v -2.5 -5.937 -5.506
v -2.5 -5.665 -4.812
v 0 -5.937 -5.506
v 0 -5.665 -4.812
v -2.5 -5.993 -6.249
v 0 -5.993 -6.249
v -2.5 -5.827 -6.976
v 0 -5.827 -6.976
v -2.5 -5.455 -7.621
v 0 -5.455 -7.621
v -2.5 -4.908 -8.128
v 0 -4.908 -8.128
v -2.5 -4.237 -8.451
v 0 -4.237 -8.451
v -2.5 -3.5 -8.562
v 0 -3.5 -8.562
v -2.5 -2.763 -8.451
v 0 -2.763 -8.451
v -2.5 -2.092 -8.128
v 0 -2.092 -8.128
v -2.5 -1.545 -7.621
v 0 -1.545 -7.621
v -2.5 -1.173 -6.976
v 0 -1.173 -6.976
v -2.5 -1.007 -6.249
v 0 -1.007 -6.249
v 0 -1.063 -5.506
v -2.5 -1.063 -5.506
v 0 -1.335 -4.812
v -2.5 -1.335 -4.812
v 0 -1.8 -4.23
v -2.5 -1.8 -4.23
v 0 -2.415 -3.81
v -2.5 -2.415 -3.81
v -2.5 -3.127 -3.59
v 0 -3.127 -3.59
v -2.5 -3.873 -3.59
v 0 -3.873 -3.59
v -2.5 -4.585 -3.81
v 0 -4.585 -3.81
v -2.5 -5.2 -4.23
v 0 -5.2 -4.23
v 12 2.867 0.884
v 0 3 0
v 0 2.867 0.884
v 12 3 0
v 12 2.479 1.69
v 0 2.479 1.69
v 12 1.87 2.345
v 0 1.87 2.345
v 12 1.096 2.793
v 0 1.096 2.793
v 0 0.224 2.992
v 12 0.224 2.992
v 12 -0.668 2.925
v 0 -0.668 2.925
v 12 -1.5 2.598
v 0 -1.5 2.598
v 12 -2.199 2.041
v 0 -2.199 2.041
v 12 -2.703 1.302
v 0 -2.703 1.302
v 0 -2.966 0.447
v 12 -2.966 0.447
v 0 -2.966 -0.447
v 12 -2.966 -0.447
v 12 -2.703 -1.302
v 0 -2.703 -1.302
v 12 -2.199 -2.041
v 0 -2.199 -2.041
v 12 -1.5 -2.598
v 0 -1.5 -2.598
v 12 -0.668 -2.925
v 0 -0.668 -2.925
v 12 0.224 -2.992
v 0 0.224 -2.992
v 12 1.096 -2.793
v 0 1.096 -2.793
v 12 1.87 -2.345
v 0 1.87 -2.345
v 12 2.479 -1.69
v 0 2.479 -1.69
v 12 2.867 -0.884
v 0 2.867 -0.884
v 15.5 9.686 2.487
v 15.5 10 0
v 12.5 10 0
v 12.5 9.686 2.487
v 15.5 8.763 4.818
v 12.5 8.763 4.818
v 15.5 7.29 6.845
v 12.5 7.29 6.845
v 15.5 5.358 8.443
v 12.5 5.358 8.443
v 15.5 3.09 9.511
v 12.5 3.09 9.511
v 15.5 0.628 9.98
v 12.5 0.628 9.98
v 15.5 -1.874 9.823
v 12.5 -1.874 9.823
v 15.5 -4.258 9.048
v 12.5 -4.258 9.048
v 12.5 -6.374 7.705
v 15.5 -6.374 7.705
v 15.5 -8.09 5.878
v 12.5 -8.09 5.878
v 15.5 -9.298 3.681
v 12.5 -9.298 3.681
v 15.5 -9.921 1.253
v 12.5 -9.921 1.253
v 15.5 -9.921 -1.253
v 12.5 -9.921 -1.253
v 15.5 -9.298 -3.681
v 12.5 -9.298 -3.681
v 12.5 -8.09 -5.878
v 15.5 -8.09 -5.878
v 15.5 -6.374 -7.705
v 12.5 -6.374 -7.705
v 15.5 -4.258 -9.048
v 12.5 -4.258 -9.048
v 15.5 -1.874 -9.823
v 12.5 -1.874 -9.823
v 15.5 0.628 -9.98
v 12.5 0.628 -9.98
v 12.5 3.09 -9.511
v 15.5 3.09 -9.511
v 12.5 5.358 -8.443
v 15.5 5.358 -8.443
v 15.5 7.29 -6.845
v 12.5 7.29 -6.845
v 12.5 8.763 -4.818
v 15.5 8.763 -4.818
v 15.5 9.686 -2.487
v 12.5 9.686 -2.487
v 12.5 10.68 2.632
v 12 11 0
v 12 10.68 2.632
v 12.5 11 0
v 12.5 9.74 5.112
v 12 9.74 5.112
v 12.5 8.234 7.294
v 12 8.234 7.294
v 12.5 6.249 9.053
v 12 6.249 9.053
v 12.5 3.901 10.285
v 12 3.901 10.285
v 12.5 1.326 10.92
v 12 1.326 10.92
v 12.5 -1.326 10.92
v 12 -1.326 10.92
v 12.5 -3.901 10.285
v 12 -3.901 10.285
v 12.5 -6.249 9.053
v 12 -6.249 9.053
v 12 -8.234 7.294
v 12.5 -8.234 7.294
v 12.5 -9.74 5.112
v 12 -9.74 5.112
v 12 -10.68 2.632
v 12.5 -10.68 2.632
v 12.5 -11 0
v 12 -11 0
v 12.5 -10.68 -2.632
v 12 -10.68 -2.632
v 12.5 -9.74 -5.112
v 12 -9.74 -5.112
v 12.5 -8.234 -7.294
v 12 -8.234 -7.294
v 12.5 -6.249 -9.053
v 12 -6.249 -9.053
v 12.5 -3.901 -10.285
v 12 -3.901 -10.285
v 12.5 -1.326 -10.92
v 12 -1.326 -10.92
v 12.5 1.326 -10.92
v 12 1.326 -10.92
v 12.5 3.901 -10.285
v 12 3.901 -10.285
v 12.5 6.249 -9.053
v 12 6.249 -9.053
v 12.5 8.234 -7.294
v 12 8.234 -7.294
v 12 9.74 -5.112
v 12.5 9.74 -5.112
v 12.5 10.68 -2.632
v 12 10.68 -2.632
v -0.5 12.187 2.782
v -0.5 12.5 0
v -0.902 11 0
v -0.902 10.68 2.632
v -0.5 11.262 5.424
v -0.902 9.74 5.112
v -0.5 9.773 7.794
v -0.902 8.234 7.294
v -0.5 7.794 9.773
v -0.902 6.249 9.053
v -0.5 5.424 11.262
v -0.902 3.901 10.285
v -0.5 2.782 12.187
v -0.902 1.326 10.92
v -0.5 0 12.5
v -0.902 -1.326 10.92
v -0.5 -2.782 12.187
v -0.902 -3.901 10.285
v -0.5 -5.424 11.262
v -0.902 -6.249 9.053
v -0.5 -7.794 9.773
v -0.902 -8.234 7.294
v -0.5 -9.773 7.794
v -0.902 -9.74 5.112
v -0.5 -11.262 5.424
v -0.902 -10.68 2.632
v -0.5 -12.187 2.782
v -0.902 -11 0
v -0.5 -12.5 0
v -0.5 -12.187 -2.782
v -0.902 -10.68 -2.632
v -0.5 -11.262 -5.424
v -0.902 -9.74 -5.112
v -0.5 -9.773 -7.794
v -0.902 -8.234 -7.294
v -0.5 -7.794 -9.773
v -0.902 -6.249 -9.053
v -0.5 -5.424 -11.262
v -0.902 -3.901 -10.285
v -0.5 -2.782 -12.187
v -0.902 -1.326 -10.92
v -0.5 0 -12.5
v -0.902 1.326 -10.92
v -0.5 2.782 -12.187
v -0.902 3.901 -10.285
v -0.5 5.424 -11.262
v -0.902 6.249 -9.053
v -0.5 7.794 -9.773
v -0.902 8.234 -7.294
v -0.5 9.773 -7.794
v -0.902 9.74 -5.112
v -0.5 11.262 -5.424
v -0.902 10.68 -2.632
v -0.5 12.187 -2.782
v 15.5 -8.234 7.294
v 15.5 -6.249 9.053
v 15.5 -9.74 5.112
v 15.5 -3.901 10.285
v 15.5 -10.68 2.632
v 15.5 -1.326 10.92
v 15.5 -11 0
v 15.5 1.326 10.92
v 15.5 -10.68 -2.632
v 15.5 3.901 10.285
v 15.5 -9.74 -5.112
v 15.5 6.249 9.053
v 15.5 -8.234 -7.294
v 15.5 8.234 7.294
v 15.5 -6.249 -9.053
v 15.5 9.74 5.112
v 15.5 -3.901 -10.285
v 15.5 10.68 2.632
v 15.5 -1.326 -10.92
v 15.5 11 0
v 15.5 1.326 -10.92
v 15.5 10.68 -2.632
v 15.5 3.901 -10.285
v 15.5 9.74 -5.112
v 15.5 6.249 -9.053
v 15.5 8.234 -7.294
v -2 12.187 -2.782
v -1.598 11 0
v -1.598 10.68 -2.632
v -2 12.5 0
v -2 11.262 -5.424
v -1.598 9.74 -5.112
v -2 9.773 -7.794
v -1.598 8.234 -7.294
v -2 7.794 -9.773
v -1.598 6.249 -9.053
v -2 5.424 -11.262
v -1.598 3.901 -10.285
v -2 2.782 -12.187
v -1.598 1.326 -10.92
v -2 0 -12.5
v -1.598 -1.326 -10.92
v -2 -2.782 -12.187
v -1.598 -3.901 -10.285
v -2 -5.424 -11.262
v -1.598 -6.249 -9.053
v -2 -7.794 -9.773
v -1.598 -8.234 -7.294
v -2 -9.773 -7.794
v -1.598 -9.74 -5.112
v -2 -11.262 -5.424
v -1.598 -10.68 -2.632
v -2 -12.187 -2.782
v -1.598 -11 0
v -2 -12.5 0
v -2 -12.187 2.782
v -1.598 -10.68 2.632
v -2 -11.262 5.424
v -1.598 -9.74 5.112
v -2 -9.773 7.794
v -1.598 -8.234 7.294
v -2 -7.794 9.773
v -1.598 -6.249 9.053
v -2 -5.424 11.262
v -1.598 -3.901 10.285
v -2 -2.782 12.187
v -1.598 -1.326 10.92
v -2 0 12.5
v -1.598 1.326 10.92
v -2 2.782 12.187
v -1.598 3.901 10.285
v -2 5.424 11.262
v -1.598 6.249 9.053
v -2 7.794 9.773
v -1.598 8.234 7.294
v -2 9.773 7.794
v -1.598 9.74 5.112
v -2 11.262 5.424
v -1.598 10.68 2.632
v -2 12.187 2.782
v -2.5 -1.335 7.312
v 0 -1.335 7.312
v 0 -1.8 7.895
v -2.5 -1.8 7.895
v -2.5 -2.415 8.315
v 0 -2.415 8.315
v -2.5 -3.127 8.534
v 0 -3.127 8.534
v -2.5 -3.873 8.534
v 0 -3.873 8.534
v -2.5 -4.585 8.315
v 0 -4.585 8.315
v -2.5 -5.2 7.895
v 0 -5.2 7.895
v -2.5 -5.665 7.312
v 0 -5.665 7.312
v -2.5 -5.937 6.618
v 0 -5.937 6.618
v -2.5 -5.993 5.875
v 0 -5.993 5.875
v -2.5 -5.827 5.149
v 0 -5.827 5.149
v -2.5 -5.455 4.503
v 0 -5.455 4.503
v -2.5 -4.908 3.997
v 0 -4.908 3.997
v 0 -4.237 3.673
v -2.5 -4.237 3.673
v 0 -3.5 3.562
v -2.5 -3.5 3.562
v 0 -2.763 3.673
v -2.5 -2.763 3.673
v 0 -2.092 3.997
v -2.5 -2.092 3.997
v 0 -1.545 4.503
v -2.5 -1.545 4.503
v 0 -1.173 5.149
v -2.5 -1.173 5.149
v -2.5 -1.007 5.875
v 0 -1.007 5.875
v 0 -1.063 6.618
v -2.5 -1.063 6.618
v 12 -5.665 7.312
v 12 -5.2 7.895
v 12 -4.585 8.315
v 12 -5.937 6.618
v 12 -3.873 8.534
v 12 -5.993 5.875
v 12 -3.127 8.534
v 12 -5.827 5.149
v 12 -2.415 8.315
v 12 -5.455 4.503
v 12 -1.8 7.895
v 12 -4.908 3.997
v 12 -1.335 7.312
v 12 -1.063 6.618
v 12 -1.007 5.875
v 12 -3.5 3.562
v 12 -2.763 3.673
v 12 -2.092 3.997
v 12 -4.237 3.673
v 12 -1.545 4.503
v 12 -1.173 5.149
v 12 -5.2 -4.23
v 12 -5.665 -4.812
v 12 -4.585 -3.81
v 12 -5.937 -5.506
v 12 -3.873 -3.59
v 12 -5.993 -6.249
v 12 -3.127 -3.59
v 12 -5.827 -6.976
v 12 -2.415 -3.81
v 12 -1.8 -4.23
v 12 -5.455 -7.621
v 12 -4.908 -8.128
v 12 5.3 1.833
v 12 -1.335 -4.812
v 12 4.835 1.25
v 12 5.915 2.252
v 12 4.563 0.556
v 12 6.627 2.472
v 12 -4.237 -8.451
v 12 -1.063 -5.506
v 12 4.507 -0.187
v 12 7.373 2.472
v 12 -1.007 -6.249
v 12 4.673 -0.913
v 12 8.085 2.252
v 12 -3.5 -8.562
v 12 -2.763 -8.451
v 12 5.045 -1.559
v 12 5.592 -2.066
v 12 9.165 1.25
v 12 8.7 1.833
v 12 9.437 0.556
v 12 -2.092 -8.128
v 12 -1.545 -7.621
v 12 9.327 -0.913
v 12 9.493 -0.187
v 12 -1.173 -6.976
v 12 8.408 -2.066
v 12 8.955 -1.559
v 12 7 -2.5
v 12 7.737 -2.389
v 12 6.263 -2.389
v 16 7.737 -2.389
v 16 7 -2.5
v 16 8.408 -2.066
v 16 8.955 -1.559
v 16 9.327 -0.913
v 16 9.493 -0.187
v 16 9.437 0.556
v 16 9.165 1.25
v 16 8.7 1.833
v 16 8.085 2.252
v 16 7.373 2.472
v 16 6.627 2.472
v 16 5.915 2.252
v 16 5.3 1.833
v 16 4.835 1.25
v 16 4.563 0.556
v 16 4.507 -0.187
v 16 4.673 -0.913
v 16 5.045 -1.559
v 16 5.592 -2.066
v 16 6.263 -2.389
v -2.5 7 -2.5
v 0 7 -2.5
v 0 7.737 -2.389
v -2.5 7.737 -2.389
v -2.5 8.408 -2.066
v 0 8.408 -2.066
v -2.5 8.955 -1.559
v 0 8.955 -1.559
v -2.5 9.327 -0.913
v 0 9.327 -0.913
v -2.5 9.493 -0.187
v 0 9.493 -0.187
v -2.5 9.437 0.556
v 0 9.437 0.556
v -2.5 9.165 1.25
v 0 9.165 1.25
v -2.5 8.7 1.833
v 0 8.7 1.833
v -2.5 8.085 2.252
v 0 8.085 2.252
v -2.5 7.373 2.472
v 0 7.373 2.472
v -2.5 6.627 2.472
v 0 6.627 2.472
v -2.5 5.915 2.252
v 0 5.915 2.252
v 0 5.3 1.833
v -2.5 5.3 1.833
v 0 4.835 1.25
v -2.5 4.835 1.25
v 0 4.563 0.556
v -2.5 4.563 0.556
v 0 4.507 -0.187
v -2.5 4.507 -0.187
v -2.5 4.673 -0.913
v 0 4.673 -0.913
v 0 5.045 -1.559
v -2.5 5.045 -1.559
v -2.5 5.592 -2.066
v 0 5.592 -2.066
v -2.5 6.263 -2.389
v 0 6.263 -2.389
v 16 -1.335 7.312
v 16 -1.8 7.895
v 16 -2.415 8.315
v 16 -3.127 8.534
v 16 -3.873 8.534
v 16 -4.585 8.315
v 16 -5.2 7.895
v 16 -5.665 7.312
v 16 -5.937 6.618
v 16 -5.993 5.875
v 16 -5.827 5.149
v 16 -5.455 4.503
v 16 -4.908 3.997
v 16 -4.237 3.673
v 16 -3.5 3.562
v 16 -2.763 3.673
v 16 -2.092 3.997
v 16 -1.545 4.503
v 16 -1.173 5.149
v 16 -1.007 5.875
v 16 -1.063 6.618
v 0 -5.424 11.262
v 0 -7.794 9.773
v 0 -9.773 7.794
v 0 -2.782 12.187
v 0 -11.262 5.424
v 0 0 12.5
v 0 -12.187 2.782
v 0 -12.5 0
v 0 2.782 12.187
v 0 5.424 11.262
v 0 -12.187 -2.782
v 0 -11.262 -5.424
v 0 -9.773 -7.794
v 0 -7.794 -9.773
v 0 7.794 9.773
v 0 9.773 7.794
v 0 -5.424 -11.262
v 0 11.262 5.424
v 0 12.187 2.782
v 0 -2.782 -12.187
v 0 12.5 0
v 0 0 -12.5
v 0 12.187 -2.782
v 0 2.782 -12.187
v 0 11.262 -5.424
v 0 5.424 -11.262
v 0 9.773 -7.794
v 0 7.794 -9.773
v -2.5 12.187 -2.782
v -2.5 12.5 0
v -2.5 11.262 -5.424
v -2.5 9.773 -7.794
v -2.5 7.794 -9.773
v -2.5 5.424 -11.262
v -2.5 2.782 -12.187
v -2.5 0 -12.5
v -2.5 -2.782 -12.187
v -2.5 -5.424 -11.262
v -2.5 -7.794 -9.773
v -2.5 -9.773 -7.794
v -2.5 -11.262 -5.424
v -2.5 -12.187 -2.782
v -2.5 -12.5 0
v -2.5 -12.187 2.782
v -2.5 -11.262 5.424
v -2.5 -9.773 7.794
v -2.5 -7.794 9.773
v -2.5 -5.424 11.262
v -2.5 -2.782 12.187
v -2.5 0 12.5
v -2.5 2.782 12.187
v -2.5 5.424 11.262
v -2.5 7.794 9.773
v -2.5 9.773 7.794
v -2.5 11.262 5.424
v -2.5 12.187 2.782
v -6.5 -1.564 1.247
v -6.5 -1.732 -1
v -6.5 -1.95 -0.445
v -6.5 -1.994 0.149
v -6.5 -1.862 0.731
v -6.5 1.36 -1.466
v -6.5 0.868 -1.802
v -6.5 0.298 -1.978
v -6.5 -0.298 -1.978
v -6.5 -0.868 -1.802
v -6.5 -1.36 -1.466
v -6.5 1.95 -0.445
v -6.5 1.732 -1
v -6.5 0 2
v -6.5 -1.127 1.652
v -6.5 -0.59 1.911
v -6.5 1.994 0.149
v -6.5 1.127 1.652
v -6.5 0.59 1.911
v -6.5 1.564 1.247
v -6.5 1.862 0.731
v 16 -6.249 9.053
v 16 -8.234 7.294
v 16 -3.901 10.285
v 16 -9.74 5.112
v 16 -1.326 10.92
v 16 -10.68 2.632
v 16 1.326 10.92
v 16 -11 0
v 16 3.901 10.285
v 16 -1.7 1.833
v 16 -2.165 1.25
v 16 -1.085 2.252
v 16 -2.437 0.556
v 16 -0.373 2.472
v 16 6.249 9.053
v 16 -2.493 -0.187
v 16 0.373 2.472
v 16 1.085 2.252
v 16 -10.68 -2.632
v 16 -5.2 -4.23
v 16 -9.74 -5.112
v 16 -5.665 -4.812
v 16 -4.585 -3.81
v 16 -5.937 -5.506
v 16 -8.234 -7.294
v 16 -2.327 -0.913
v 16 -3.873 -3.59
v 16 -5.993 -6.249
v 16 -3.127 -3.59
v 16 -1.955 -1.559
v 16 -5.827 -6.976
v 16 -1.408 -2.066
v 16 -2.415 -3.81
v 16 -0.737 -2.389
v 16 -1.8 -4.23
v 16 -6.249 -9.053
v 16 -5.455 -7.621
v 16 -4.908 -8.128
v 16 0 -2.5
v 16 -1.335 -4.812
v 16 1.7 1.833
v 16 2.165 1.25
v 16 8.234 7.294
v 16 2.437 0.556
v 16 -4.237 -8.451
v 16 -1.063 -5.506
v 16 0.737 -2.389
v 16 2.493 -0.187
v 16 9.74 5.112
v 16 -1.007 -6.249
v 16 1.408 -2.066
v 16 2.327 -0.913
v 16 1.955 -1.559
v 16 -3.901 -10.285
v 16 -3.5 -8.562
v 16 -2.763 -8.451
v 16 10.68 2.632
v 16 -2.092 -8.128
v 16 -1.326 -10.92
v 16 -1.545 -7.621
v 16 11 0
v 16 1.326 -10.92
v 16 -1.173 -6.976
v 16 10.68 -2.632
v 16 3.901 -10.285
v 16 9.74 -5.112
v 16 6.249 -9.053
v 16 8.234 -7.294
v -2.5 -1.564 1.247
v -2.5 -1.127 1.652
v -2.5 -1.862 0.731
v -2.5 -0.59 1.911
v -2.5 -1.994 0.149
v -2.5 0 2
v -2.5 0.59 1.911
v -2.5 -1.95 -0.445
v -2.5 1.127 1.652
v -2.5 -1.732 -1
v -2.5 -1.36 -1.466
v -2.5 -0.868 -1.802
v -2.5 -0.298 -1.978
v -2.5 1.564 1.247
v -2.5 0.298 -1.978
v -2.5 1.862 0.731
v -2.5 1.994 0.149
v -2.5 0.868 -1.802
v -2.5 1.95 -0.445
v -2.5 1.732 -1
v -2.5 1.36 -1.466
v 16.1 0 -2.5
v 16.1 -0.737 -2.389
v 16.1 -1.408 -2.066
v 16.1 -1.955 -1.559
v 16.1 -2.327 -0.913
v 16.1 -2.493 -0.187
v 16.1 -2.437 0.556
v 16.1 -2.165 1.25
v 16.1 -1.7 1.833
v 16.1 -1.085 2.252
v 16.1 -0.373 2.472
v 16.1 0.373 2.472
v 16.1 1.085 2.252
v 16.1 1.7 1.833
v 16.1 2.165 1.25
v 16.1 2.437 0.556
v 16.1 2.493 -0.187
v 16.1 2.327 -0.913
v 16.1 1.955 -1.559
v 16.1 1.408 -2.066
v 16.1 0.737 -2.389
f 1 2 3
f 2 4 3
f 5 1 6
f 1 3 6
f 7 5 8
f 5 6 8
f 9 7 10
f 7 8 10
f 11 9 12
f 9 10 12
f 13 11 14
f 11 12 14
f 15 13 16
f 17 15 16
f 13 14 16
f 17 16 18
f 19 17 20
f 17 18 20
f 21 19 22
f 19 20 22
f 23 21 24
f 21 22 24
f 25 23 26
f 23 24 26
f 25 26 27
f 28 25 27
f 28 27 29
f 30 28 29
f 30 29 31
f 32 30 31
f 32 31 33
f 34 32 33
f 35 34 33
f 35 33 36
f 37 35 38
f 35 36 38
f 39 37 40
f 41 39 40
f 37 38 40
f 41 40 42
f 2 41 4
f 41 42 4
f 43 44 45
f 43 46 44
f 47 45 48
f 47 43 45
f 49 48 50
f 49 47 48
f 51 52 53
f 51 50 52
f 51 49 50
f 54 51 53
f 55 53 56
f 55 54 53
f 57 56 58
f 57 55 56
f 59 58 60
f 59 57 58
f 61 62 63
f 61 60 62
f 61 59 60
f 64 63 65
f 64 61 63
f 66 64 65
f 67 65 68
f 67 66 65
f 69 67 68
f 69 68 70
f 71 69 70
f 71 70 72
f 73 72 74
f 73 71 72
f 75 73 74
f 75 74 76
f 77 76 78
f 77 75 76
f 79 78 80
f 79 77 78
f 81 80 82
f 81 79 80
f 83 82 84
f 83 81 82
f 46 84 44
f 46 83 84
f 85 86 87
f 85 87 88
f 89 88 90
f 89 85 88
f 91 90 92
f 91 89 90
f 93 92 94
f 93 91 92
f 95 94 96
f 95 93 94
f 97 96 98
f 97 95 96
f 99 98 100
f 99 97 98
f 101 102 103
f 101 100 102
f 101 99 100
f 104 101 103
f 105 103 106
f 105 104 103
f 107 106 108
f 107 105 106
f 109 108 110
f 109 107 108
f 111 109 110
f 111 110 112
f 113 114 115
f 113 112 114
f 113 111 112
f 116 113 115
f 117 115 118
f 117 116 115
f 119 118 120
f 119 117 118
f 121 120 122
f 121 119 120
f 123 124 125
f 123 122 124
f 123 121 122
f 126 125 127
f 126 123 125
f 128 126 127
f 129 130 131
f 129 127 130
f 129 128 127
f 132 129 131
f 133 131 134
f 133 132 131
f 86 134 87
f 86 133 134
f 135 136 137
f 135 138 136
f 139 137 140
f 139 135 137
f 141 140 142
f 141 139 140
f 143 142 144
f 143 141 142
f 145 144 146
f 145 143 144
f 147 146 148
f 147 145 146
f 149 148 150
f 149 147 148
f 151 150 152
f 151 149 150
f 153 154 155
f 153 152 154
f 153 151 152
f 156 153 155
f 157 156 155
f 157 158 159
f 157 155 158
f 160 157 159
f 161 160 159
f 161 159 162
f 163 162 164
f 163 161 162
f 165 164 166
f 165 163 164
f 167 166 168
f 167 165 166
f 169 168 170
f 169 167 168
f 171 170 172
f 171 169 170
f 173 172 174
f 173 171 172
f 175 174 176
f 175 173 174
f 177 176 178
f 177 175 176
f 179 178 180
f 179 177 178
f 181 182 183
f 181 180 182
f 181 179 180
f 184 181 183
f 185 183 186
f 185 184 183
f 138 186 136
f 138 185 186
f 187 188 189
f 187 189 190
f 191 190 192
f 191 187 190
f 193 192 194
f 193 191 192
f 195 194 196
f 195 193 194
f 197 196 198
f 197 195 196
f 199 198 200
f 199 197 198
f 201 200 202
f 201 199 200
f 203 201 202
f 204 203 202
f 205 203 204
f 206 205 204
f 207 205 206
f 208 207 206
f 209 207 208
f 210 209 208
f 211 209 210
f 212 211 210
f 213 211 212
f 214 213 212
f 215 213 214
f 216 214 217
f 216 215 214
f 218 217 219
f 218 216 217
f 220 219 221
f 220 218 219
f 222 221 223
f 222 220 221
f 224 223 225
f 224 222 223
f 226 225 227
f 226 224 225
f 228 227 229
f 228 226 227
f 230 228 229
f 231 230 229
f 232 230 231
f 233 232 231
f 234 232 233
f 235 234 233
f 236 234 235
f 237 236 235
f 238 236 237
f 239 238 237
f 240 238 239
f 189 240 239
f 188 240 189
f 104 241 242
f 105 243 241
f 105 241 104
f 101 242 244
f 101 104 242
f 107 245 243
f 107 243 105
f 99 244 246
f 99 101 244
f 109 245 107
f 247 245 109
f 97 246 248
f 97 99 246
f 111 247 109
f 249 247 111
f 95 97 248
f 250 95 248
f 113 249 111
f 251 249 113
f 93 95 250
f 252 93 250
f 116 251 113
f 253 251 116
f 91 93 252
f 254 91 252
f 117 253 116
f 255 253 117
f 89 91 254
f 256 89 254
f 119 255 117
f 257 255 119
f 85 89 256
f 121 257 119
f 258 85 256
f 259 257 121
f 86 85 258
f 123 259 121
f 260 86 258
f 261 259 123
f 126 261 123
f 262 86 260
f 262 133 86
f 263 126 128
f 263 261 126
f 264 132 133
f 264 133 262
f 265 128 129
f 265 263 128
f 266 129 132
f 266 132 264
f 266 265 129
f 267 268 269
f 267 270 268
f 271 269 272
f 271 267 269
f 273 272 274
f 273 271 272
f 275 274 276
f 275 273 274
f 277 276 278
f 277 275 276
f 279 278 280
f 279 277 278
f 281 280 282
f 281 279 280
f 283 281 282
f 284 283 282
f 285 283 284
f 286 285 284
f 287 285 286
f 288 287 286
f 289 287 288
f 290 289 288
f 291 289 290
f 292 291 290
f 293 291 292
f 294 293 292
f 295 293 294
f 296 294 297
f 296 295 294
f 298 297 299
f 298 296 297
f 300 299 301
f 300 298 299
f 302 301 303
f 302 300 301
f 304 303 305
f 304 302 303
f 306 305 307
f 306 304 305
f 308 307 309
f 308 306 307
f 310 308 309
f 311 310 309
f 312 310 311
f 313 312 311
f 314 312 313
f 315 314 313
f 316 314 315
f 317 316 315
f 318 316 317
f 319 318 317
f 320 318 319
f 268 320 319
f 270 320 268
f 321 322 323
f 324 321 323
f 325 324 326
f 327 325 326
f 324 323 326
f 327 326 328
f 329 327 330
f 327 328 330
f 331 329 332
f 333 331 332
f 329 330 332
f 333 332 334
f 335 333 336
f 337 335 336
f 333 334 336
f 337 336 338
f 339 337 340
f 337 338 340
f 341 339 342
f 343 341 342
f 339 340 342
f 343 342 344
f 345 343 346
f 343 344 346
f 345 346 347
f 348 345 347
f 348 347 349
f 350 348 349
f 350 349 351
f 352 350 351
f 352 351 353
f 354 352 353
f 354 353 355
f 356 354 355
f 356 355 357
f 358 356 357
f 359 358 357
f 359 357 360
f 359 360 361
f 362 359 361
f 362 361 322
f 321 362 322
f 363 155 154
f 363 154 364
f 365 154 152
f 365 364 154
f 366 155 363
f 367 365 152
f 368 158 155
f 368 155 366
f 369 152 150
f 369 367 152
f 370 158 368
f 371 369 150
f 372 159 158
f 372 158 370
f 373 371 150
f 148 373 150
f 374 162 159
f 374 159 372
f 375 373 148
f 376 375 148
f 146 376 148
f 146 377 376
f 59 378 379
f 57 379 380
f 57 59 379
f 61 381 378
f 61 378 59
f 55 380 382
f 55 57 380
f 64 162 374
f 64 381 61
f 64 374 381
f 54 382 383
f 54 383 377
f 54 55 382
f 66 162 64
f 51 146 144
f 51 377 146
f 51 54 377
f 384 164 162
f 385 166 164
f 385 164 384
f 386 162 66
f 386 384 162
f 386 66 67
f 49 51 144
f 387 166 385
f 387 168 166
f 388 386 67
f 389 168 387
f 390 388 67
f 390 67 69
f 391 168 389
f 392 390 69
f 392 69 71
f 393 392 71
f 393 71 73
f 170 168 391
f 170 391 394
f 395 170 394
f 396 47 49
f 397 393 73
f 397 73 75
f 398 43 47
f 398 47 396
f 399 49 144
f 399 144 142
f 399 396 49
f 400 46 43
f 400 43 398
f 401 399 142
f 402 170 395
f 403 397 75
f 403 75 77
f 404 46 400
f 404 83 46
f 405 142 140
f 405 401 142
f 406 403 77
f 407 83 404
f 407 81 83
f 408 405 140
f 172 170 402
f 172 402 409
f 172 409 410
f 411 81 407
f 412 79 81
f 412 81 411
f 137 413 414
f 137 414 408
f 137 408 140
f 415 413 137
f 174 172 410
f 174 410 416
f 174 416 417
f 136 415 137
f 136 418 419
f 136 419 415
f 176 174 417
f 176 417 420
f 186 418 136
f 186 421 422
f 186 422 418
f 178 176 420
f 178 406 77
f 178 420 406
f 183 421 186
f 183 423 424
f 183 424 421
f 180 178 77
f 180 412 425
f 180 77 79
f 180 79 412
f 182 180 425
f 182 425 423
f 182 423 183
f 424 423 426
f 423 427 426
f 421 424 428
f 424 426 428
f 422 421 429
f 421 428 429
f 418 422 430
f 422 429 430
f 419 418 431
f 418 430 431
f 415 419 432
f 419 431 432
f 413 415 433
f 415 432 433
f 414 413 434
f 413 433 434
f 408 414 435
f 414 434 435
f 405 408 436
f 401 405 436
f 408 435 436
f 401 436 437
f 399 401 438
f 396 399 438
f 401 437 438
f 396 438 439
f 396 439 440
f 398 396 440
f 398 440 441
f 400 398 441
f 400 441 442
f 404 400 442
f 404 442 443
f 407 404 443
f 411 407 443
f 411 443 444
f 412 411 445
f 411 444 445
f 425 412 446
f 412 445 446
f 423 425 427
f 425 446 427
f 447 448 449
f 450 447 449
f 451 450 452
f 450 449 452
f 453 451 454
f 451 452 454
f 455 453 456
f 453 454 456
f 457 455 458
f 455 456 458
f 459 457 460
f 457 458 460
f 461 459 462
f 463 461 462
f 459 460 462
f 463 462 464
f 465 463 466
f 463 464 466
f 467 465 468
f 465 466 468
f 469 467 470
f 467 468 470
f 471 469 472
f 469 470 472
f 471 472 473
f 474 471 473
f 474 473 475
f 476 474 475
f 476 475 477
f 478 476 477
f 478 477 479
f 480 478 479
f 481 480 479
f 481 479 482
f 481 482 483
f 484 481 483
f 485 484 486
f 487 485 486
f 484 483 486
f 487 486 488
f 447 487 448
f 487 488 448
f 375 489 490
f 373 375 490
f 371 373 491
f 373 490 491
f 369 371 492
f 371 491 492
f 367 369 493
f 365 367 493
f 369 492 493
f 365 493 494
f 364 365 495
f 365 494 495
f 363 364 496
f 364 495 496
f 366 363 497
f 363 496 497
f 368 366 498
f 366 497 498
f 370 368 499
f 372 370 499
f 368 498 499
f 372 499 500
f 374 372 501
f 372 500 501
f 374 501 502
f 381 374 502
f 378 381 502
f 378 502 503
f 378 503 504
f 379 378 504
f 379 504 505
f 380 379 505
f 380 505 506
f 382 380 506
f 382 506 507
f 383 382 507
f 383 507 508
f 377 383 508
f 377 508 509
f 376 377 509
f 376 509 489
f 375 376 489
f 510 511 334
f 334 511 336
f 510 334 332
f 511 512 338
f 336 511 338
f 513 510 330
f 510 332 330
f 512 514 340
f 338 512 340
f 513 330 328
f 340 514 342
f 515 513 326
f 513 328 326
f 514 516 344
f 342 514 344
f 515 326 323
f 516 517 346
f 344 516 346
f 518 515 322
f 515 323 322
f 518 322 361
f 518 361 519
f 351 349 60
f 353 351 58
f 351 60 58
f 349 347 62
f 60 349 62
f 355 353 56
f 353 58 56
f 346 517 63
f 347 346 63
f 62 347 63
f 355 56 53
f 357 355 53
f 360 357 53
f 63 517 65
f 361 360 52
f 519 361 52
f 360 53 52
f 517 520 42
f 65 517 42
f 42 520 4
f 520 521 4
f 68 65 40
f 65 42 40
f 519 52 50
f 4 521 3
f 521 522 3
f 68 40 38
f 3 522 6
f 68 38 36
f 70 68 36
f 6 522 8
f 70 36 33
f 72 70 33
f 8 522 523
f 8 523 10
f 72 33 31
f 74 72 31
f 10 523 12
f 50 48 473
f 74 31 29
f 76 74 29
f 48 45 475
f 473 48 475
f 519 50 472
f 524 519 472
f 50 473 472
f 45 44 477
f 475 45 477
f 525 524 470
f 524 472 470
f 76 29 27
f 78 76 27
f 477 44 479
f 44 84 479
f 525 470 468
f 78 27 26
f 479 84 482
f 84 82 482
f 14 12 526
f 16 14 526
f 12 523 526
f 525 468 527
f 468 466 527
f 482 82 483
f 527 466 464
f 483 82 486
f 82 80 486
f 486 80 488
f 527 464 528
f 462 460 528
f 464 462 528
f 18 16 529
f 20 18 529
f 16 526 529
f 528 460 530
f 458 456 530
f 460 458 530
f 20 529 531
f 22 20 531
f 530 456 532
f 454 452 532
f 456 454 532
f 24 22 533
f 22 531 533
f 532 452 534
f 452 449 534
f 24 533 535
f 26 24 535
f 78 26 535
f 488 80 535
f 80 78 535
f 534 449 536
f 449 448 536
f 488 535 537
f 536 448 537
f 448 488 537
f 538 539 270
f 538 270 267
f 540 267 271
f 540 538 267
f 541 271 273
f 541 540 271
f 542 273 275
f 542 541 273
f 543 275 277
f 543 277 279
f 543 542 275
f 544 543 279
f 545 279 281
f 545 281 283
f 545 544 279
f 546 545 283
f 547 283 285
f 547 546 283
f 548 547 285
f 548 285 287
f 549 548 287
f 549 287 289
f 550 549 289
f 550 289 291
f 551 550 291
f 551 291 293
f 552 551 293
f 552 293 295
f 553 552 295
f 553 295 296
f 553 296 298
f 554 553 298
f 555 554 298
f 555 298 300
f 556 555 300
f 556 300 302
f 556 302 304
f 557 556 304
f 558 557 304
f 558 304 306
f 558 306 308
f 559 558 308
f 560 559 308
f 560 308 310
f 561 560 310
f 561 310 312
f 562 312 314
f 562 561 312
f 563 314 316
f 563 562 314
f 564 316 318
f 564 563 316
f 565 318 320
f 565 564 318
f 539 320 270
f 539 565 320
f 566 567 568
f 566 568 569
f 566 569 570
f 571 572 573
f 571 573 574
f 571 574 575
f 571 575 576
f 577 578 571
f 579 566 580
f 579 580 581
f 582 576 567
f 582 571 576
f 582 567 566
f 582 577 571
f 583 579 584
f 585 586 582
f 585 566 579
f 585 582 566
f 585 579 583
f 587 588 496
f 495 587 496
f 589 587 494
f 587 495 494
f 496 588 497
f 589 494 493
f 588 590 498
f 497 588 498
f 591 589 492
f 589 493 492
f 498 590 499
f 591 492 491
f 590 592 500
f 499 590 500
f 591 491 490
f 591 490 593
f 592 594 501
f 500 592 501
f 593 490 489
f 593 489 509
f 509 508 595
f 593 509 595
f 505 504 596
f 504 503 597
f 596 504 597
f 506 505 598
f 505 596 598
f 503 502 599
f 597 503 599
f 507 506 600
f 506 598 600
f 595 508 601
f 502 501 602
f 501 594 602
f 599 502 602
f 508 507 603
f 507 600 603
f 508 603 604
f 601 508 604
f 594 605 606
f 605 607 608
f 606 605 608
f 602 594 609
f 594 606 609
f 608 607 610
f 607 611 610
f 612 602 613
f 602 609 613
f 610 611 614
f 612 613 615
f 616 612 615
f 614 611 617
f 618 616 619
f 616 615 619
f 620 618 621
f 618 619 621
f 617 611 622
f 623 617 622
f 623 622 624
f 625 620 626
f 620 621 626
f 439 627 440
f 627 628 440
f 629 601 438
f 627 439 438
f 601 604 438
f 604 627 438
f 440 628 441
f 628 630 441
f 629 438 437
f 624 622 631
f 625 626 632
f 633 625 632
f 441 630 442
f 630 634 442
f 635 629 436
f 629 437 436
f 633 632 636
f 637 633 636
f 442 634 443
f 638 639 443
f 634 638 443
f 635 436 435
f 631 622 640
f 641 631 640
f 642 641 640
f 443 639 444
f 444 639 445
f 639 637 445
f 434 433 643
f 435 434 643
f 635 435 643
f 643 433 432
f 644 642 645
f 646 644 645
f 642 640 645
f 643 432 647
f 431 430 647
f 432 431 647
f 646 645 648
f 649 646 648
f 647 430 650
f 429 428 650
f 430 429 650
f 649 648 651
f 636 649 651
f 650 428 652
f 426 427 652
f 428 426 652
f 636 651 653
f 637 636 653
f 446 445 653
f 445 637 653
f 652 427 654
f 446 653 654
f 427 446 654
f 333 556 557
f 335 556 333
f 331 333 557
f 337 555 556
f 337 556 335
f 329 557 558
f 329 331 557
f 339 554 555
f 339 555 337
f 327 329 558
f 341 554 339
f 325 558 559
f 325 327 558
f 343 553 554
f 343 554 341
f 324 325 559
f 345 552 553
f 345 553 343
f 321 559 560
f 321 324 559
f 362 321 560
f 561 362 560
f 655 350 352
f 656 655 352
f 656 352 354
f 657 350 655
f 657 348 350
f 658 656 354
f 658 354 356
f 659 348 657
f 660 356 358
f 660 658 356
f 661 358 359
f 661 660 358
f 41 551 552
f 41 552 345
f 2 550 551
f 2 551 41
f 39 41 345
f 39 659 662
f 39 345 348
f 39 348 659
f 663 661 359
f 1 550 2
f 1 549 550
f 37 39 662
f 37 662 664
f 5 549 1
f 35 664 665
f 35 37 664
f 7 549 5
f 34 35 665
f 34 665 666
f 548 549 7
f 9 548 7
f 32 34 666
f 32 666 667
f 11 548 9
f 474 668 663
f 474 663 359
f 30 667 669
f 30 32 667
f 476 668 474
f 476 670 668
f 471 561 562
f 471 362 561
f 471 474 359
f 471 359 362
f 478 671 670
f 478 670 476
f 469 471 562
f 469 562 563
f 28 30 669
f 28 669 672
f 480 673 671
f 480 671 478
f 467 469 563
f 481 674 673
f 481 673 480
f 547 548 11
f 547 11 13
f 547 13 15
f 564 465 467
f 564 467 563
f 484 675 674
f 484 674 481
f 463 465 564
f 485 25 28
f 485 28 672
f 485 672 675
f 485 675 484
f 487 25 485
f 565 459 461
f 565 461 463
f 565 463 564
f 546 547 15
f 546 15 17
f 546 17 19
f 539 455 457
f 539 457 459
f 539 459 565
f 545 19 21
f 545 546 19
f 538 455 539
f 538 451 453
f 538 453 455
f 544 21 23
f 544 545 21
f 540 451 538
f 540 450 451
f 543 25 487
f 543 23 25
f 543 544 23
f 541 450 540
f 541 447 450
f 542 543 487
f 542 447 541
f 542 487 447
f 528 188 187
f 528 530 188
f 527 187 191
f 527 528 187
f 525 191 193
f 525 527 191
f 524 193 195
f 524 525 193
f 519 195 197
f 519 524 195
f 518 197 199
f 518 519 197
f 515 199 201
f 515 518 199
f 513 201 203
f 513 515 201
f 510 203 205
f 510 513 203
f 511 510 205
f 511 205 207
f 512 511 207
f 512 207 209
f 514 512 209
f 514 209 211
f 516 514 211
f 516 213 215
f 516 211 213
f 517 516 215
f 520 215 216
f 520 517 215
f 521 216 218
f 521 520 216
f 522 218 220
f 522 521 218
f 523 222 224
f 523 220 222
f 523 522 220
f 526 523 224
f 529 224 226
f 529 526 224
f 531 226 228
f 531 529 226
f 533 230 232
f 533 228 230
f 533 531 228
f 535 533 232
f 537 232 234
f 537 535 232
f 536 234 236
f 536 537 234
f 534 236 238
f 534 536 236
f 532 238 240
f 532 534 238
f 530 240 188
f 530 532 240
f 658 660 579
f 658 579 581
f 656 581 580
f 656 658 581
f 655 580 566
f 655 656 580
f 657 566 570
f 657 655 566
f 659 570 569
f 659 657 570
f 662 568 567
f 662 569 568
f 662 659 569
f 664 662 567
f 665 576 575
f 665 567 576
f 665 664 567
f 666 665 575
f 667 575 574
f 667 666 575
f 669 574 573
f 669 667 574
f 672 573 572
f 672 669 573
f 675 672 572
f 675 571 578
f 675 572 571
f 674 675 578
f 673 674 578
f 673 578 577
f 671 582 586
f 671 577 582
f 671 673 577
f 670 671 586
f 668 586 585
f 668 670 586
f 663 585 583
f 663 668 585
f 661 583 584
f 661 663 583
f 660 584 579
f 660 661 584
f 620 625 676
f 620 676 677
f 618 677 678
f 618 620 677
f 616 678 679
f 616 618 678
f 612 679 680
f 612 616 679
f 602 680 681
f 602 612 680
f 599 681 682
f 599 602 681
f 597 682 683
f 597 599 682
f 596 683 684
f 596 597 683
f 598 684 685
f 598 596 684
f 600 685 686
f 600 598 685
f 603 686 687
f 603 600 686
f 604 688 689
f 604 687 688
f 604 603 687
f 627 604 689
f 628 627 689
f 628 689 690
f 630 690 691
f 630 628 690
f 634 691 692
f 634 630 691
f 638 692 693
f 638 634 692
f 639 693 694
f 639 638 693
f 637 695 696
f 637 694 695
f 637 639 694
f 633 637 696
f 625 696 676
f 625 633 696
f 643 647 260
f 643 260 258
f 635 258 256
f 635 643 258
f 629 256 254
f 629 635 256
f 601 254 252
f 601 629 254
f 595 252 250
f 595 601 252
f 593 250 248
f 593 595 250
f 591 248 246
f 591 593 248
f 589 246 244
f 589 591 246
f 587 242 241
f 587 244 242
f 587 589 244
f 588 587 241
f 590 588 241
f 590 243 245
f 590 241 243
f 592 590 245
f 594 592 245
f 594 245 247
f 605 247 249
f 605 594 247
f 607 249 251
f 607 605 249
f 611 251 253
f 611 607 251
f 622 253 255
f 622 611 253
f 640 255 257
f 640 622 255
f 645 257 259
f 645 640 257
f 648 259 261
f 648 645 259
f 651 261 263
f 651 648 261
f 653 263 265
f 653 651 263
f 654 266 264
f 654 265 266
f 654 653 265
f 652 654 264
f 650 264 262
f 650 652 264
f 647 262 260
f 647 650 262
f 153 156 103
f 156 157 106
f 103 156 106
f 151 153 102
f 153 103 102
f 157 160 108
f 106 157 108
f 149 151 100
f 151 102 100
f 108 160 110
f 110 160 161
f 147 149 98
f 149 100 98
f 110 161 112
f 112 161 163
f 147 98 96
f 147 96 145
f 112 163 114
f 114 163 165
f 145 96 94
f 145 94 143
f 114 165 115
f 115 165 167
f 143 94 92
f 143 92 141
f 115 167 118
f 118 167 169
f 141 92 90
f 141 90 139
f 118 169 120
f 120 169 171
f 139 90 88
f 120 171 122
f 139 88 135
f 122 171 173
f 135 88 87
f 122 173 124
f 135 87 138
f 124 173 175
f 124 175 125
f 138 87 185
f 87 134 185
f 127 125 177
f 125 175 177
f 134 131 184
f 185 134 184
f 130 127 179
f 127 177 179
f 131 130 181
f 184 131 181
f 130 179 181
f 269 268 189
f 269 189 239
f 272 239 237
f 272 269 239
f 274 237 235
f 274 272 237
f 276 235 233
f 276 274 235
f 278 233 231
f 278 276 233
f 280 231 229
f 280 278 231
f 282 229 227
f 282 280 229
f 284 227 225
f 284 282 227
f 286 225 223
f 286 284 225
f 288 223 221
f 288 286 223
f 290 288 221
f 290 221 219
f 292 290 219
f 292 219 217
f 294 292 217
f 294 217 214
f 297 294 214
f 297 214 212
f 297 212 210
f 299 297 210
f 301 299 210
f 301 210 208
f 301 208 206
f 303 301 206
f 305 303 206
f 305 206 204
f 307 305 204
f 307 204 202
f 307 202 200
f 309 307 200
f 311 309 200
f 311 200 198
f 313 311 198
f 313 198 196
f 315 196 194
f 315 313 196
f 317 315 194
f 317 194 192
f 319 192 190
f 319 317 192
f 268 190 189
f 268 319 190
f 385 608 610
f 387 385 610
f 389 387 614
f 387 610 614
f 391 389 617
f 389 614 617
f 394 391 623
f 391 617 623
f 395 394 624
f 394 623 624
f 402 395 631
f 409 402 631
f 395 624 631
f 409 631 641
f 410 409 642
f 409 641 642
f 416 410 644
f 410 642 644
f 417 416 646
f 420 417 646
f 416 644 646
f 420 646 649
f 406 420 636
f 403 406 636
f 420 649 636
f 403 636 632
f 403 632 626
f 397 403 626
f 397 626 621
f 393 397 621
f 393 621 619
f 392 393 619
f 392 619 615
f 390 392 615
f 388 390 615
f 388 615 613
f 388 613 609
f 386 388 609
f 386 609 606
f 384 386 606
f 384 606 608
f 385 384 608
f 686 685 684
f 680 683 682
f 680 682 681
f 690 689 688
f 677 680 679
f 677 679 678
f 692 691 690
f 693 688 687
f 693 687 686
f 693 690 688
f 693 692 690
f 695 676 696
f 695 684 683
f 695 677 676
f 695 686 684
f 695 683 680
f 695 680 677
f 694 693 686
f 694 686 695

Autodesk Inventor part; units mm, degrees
ref_plane "YZ Plane" through (0, 0, 0) normal (1, 0, 0) x (0, 1, 0)
ref_plane "XZ Plane" through (0, 0, 0) normal (0, 1, 0) x (-1, 0, 0)
ref_plane "XY Plane" through (0, 0, 0) normal (0, 0, 1) x (1, 0, 0)
sketch "Sketch1" plane through (0, 0, 0) normal (0, 0, 1) x (1, 0, 0)
  line L0 (0, 0) -> (0, 3)
  line L1 (0, 3) -> (12, 3)
  line L2 (12, 3) -> (12, 11)
  line L3 (12, 11) -> (12.5, 11)
  line L4 (12.5, 11) -> (12.5, 10)
  line L5 (12.5, 10) -> (15.5, 10)
  line L6 (15.5, 10) -> (15.5, 11)
  line L7 (15.5, 11) -> (16, 11)
  line L8 (16, 11) -> (16, 0)
  line L9 (16, 0) -> (0, 0)
  dimension "d0" = 3
  dimension "d1" = 12
  dimension "d2" = 0.5
  dimension "d3" = 10
  dimension "d4" = 0.5
  dimension "d5" = 1
  dimension "d6" = 3
revolve "Revolution1" add sketch "Sketch1" angle 360 about axis through (16, 0, 0) along (-1, 0, 0)
sketch "Sketch2" plane through (0, 0, 0) normal (0, 0, 1) x (1, 0, 0)
  line L0 (0, -3) -> (0, 3) projected
  line L1 (0, 0) -> (-2.5, 0)
  line L2 (-2.5, 0) -> (-2.5, 12.5)
  line L3 (-2.5, 12.5) -> (0, 12.5) construction
  line L4 (0, 12.5) -> (0, 0)
  line L5 (-1.25, 12.5) -> (-1.25, 11) construction
  line L6 (-1.25, 11) -> (-1.5981, 11)
  line L7 (-1.5981, 11) -> (-2, 12.5)
  line L8 (-0.9019, 11) -> (-0.5, 12.5)
  line L9 (-0.9019, 11) -> (-1.25, 11)
  line L10 (-2, 12.5) -> (-2.5, 12.5)
  line L11 (-0.5, 12.5) -> (0, 12.5)
  dimension "d8" = 12.5
  dimension "d9" = 2.5
  dimension "d10" = 1.5
  dimension "d11" = 15
  dimension "d12" = 0.75
revolve "Revolution2" add sketch "Sketch2" angle 360 about axis through (0, 0, 0) along (-1, 0, 0)
sketch "Sketch3" plane through (-2.5, 0, 0) normal (-1, 0, 0) x (0, 0, 1)
  circle A0 centre (0, 0) radius 12.5 projected
  circle A1 centre (0, 0) radius 2
  dimension "d14" = 4
extrude "Extrusion1" add sketch "Sketch3" along normal blind 4 contours A1
sketch "Sketch4" plane through (16, 0, 0) normal (1, 0, 0) x (0, 0, -1)
  circle A0 centre (0, 0) radius 10.5
  circle A1 centre (0, 0) radius 10
  circle A2 centre (0, 0) radius 11
  circle A3 centre (0, 7) radius 2.5
  circle A4 centre (0, 0) radius 3 construction
  dimension "d17" = 7
  dimension "d18" = 5
  dimension "d19" = 6
extrude "Extrusion2" cut sketch "Sketch4" against normal through all contours A3
pattern_circular "Circular Pattern1" count 3 over 360 about axis through (6, 0, 0) along (1, 0, 0) of "Extrusion2"
sketch "Sketch5" plane through (16, 0, 0) normal (1, 0, 0) x (0, 0, -1)
  circle A0 centre (0, 0) radius 11 projected
  circle A1 centre (0, 0) radius 2.5
  dimension "d25" = 5
extrude "Extrusion3" add sketch "Sketch5" along normal blind 0.1 contours A1
properties part number "PulleyMotor"
